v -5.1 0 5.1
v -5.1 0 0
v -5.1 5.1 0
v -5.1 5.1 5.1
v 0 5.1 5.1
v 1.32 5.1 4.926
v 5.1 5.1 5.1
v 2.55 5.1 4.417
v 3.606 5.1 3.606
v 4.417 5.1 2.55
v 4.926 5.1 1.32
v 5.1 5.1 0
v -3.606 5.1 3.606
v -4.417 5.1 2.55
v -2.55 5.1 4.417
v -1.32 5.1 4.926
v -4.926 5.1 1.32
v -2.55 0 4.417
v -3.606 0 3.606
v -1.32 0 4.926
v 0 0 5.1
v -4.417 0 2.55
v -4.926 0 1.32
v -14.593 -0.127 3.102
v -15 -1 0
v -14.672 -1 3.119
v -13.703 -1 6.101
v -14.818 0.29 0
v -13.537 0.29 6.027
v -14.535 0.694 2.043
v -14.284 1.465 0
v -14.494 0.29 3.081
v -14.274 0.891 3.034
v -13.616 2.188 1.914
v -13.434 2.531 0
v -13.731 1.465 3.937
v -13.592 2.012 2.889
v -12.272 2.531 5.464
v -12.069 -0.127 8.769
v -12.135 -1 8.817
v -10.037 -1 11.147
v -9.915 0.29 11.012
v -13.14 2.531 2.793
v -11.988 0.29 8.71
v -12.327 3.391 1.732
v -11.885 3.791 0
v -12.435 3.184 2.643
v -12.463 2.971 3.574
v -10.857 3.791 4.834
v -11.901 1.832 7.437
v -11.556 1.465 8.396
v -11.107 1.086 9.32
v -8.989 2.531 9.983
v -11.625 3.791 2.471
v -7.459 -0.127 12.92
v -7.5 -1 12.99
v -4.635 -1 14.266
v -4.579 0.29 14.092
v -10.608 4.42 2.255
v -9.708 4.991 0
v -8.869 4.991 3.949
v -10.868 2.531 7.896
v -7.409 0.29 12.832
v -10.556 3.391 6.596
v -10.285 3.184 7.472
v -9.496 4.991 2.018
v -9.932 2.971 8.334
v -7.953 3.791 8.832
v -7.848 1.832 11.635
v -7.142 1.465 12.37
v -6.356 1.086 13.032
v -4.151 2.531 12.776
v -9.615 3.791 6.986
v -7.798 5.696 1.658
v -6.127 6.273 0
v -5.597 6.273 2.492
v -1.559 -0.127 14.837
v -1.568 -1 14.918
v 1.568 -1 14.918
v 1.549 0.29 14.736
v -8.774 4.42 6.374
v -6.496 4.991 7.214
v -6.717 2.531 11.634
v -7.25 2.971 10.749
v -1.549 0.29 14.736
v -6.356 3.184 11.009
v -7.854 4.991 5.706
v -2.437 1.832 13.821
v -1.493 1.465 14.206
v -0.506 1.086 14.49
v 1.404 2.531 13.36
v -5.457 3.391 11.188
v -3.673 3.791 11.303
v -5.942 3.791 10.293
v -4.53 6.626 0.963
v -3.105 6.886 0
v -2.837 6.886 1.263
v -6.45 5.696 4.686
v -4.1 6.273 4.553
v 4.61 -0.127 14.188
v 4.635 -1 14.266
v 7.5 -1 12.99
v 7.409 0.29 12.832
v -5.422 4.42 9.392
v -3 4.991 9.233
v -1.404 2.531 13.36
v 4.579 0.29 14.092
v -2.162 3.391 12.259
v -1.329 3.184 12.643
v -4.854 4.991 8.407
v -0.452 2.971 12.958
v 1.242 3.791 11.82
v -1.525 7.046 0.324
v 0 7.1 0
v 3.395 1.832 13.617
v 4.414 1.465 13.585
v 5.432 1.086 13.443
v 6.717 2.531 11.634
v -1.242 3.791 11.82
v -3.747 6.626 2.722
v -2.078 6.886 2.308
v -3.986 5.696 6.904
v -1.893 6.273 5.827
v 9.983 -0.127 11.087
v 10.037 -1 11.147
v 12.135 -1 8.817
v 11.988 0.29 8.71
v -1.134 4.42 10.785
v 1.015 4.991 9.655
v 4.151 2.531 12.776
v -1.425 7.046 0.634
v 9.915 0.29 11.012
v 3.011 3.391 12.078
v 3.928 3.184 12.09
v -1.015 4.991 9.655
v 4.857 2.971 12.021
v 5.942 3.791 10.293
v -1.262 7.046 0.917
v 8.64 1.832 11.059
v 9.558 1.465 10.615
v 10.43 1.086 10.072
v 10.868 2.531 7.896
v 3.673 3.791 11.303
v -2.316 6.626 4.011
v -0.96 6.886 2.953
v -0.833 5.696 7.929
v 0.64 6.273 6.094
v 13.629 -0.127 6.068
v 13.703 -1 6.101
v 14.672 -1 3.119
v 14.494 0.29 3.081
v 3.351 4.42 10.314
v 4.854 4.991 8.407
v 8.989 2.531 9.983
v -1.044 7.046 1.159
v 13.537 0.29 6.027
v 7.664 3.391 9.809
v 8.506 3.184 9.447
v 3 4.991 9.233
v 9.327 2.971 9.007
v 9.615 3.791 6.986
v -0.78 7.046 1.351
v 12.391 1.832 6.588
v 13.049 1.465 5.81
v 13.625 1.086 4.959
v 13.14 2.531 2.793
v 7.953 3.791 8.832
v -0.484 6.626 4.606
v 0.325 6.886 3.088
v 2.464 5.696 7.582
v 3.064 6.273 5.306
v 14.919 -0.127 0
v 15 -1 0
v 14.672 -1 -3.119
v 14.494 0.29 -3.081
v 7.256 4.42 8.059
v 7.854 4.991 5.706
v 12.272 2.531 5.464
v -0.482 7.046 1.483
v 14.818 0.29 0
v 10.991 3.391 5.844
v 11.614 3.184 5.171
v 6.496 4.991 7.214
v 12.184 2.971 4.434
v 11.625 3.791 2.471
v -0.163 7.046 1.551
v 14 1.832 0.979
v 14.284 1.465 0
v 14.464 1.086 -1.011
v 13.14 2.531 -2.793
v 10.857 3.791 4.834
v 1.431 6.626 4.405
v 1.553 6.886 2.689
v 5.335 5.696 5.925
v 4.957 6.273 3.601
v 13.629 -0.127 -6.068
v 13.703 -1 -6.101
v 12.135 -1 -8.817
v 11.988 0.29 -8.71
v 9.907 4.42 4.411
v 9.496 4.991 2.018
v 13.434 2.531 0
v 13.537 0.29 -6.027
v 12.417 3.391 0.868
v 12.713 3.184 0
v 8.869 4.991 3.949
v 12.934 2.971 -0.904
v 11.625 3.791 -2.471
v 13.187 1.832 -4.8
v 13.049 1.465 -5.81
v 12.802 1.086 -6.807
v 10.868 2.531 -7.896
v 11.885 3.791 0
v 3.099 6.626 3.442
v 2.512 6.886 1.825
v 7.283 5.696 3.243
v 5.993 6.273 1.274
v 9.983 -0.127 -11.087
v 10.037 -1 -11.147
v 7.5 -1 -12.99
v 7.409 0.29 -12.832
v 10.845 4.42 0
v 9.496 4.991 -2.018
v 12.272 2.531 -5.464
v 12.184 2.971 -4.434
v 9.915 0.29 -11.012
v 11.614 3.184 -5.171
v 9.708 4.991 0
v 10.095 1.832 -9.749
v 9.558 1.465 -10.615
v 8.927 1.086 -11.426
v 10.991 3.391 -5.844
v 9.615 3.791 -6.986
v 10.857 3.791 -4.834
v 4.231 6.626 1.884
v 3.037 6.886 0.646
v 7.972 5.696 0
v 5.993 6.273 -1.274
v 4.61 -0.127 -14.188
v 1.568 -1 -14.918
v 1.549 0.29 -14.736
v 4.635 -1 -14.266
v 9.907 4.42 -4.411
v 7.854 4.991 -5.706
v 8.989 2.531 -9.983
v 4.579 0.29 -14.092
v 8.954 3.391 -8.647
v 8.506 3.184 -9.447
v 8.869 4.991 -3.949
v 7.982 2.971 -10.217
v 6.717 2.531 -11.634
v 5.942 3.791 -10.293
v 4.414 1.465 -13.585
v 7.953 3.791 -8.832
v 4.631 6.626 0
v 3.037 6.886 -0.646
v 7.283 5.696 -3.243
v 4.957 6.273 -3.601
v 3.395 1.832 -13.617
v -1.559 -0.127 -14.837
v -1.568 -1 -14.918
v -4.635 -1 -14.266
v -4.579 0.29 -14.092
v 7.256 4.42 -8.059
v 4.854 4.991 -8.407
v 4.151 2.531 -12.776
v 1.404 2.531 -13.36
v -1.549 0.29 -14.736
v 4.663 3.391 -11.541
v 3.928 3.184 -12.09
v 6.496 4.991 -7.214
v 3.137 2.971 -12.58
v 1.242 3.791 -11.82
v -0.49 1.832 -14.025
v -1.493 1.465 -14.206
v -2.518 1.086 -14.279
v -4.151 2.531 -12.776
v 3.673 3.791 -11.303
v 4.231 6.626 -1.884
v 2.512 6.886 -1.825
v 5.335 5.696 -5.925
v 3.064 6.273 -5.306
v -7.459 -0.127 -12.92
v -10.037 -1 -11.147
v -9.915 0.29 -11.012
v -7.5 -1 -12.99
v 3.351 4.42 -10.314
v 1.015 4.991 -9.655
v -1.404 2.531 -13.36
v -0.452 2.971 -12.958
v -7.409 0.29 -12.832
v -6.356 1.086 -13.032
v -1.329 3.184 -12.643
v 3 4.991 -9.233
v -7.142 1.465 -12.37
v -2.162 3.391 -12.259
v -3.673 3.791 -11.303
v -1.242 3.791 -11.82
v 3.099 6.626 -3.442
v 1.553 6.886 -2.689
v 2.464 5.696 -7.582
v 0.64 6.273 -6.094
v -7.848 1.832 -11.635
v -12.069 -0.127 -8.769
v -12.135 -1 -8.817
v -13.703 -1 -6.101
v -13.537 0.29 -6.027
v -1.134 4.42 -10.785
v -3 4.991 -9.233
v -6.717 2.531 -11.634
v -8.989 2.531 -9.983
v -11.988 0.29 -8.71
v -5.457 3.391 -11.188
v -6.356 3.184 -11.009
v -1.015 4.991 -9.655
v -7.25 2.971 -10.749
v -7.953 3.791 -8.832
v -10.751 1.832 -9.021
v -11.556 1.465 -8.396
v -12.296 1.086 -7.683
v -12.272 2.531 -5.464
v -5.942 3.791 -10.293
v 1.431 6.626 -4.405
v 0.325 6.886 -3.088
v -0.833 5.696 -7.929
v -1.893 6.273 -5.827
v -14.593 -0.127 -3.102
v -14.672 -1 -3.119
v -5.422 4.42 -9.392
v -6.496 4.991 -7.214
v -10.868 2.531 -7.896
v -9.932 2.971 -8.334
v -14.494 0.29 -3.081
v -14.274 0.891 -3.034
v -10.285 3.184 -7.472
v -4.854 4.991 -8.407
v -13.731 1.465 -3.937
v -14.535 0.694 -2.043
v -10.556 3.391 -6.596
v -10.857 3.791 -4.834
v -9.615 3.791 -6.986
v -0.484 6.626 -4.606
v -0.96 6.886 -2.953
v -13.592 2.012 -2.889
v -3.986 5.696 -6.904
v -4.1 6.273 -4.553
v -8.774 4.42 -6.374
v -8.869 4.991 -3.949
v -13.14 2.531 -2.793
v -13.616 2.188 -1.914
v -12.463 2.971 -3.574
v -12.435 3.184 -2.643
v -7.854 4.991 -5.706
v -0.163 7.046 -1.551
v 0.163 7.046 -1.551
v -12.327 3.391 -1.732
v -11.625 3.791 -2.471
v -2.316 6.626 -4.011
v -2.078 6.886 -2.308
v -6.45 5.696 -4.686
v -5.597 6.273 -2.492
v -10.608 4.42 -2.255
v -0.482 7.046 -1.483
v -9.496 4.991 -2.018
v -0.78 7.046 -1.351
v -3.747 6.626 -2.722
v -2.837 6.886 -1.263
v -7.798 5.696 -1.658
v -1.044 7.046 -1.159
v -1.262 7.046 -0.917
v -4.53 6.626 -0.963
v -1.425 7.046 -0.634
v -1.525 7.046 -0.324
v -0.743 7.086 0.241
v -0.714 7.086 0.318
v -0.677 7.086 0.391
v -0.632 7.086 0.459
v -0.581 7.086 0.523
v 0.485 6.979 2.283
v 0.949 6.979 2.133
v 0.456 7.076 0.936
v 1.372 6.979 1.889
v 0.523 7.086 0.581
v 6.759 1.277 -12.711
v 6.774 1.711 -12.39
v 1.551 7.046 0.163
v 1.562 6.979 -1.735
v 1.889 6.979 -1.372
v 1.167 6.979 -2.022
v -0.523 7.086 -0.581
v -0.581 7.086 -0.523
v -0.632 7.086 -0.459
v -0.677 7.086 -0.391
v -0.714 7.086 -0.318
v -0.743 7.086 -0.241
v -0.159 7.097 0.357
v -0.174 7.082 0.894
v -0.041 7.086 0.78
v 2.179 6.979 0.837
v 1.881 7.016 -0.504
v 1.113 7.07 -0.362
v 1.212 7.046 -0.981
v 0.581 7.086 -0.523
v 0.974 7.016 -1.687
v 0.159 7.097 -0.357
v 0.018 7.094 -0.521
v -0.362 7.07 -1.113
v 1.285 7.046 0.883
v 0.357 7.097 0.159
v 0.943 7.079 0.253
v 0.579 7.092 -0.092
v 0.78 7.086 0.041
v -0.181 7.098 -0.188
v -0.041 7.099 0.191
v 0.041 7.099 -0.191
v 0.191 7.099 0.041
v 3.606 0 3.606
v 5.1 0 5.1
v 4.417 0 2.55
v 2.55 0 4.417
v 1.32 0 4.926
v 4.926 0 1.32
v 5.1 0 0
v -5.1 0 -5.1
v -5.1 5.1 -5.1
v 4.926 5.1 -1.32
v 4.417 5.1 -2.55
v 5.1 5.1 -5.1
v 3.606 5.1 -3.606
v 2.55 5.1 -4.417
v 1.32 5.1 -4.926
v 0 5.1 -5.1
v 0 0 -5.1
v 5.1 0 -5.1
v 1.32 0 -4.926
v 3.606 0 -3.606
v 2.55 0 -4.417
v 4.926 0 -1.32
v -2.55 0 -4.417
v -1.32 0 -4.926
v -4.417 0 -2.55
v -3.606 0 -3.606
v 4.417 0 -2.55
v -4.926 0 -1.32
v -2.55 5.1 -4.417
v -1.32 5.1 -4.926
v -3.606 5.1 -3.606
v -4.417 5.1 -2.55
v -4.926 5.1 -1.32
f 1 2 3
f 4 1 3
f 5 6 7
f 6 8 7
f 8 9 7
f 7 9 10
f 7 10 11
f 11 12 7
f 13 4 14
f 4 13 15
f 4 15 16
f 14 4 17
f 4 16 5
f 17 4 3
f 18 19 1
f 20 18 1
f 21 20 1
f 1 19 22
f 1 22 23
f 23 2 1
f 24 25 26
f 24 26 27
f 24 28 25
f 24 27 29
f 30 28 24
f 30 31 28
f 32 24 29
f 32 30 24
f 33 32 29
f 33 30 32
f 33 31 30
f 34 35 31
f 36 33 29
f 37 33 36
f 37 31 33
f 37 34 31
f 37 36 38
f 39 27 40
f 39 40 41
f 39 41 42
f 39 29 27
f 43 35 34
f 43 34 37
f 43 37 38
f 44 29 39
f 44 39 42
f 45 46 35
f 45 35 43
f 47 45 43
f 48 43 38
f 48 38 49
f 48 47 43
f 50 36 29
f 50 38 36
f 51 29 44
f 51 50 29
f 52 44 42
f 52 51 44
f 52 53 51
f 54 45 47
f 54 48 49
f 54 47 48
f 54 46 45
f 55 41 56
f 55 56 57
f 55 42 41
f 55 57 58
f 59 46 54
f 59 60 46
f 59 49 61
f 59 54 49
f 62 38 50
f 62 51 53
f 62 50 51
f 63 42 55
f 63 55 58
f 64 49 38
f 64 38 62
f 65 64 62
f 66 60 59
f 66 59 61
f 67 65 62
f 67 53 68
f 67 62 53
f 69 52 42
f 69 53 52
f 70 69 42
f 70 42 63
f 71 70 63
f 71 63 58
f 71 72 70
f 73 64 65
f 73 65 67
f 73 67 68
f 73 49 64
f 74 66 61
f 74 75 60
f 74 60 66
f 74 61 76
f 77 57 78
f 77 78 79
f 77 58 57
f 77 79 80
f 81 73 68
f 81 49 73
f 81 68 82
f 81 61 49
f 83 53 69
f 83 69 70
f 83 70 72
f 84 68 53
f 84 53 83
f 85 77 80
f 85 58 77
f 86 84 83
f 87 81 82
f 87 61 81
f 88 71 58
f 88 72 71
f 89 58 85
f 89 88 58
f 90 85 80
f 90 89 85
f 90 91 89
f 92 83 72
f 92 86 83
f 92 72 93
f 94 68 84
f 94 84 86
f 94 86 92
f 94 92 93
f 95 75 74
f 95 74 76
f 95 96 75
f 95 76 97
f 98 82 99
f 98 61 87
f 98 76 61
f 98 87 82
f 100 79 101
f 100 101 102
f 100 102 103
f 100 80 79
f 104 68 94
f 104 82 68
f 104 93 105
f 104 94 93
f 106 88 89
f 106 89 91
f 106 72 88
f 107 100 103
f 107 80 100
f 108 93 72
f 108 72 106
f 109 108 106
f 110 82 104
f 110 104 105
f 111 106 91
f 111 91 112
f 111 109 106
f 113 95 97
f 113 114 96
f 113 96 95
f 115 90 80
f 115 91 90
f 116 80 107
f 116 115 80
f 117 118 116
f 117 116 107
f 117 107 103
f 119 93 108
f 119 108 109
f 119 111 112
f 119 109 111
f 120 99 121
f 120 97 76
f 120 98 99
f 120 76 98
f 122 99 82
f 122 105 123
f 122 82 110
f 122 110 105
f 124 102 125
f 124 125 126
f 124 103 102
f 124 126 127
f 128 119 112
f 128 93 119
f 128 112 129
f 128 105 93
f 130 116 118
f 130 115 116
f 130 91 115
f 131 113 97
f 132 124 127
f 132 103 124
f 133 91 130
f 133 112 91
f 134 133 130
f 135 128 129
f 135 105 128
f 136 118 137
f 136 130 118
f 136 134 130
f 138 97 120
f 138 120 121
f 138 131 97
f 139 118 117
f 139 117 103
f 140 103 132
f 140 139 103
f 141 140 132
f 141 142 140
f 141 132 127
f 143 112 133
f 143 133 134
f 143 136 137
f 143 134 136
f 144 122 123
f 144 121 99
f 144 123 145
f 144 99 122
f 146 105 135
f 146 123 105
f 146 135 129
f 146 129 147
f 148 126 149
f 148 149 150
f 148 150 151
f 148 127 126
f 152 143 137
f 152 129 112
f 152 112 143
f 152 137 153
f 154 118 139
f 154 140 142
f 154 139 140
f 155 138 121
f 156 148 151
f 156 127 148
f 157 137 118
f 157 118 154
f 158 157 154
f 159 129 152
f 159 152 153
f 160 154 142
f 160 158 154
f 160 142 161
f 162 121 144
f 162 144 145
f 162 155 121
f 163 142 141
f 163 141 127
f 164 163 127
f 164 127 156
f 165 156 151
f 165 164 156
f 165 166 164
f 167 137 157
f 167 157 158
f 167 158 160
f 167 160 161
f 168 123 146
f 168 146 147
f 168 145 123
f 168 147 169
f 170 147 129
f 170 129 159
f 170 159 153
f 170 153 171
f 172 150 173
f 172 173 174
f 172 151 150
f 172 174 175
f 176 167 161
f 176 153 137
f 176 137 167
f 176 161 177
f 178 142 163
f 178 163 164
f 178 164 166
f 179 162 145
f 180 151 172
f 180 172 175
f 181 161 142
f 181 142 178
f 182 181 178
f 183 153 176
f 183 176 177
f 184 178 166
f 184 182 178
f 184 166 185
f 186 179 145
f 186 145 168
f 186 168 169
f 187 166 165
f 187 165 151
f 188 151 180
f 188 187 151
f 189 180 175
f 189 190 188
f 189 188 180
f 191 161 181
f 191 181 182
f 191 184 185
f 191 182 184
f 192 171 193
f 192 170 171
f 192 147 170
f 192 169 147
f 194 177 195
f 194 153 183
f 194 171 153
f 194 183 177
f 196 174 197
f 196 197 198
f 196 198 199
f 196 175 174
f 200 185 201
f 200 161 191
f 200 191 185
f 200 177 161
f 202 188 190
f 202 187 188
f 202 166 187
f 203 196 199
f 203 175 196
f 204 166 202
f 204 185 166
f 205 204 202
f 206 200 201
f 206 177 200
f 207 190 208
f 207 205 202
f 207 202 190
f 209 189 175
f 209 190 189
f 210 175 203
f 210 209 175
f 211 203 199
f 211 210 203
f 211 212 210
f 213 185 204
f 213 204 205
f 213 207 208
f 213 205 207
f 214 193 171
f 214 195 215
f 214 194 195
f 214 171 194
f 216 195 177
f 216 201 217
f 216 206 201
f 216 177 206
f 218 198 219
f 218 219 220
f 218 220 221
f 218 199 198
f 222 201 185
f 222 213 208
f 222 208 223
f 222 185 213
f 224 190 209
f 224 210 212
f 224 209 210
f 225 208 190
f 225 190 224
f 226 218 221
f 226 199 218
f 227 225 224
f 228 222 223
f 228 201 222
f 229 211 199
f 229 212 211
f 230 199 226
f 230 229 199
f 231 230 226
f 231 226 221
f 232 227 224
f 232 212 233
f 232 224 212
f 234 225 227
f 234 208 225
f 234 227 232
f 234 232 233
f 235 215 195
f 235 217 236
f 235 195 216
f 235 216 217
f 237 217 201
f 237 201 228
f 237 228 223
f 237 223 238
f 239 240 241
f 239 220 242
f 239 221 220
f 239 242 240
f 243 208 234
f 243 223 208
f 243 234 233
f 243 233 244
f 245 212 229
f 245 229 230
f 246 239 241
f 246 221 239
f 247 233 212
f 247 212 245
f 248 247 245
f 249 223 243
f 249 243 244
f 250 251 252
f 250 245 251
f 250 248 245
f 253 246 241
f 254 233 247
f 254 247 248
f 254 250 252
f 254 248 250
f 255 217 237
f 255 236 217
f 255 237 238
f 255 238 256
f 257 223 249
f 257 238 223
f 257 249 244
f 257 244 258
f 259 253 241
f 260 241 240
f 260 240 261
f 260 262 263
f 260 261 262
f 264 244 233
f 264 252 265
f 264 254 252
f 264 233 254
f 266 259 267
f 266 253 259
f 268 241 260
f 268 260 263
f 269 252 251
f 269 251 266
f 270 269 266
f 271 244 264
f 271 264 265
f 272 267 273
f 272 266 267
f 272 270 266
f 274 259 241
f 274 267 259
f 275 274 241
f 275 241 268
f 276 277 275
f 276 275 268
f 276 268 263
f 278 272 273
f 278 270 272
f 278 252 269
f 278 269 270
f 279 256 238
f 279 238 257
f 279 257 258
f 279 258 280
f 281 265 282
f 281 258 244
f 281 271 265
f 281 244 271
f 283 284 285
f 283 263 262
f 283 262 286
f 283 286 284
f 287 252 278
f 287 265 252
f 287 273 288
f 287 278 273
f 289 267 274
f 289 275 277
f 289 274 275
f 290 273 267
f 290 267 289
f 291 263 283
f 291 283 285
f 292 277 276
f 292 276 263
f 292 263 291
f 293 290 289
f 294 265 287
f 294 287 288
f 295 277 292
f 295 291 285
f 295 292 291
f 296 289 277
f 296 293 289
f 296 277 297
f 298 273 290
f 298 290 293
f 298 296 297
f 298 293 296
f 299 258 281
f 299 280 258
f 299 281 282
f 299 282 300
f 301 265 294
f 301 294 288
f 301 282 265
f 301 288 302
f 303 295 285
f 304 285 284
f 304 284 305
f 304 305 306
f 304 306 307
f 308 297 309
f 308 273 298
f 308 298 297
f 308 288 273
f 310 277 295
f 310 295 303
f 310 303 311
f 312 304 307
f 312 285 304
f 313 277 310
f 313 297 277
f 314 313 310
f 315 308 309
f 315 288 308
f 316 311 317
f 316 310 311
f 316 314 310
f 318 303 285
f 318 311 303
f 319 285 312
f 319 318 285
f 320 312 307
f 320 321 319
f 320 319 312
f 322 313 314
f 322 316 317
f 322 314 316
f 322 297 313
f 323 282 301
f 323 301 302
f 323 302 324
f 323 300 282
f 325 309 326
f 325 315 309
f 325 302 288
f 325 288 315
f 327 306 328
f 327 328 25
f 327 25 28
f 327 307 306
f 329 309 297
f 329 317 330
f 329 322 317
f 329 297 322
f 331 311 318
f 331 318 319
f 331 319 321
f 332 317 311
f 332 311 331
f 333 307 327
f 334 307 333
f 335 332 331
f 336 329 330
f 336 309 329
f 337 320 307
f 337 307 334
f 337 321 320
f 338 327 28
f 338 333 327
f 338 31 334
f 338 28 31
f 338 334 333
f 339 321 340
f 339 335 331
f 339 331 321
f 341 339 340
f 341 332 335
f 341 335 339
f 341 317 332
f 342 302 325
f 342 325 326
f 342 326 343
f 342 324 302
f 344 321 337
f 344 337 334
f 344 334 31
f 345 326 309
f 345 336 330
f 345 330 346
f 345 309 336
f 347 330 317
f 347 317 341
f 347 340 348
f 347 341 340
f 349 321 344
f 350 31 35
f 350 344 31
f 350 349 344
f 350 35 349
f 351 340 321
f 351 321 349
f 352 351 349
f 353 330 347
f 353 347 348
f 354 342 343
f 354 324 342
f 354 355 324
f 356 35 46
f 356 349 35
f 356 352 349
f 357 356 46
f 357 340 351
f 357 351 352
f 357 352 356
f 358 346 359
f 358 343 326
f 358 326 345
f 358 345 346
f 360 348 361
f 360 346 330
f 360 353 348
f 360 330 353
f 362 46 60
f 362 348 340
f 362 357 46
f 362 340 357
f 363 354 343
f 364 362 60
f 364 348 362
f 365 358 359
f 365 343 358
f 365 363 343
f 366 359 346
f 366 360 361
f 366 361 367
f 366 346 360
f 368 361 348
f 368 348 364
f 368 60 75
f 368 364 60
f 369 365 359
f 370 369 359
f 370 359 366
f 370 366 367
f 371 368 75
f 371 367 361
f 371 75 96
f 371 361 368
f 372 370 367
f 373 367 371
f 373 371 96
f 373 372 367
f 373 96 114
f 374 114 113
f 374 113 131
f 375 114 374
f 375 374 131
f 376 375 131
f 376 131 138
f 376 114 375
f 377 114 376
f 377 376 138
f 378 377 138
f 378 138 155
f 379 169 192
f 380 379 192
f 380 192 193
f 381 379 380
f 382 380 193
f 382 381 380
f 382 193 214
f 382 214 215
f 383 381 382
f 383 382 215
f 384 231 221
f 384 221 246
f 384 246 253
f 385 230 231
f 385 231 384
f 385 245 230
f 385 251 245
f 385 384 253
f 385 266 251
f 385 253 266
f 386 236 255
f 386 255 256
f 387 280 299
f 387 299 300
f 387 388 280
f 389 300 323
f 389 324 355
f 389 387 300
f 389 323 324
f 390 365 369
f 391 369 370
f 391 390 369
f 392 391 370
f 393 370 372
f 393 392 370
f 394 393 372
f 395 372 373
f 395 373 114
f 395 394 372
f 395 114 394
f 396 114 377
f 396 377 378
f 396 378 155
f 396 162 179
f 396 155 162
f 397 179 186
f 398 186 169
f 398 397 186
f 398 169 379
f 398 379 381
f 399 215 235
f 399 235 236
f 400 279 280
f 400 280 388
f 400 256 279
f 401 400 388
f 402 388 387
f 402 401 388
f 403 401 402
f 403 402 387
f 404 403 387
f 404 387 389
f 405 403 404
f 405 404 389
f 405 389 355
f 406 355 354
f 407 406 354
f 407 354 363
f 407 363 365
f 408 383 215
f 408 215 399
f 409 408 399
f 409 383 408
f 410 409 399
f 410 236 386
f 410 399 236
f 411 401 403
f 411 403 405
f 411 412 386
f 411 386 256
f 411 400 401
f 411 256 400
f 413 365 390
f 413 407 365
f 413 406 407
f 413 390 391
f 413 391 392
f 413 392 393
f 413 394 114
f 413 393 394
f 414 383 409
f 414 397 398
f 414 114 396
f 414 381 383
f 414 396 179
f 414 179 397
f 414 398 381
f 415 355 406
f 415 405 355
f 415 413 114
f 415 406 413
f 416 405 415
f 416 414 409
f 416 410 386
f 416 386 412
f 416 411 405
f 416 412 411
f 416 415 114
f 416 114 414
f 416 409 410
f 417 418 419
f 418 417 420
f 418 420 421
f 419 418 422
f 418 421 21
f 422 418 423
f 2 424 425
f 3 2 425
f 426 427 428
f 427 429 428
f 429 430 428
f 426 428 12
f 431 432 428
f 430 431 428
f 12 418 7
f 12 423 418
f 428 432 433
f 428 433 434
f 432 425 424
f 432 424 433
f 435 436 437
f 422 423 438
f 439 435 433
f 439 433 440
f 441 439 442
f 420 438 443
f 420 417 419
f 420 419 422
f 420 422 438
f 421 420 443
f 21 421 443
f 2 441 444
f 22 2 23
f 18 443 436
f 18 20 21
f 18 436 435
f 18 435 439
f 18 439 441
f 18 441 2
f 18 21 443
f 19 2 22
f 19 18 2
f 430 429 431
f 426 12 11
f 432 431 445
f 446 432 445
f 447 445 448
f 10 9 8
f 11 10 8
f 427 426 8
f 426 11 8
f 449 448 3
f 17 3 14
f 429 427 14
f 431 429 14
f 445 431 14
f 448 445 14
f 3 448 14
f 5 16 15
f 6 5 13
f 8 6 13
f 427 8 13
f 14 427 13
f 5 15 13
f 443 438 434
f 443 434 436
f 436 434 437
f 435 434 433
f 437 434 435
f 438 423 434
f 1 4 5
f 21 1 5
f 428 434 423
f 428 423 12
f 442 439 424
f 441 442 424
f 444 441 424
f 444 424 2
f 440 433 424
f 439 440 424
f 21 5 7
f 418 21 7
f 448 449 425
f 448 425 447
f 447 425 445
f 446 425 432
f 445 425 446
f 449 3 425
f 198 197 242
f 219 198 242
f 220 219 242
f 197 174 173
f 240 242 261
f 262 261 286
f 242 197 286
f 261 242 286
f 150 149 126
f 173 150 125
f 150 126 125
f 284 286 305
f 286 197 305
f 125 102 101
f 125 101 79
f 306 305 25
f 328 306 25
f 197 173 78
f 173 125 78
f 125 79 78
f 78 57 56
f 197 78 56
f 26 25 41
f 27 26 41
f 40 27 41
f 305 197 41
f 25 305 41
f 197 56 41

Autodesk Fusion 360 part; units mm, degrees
sketch "Sketch1" plane through (0, 0, 0) normal (0, 0, 1) x (1, 0, 0)
  line L0 (0, 0) -> (-5.1, 0)
  line L1 (-5.1, 0) -> (-5.1, 5.1)
  line L2 (-5.1, 5.1) -> (0, 5.1)
  line L3 (0, 5.1) -> (0, 7.1)
  line L4 (0, 0) -> (0, -1)
  line L5 (0, -1) -> (-15, -1)
  spline S0 degree 5 poles (-15, -1) (-15, -0.3922) (-14.8133, 0.764) (-13.9738, 2.3202) (-11.8994, 4.069) (-8.3141, 5.7563) (-5.0579, 6.6606) (-2.5435, 7.0201) (-0.8506, 7.1) (0, 7.1) knots 0 0 0 0 0 0 0.2 0.4 0.6 0.8 1 1 1 1 1 1
  line L6 (-2.5, 7.1) -> (2.5, 7.1)
  line L7 (-15, -2.5) -> (-15, 0.5)
  line L8 (0, 2.5) -> (0, 20)
  line L9 (0, 0) -> (5.1, 0)
  spline S1 degree 5 poles (15, -1) (15, -0.3922) (14.8133, 0.764) (13.9738, 2.3202) (11.8994, 4.069) (8.3141, 5.7563) (5.0579, 6.6606) (2.5435, 7.0201) (0.8506, 7.1) (0, 7.1) knots 0 0 0 0 0 0 0.2 0.4 0.6 0.8 1 1 1 1 1 1
  line L10 (15, -2.5) -> (15, 0.5)
  line L11 (2.5, 7.1) -> (-2.5, 7.1)
  line L12 (0, -1) -> (15, -1)
  line L13 (0, 0) -> (0, -1)
  line L14 (5.1, 5.1) -> (0, 5.1)
  line L15 (0, 5.1) -> (0, 7.1)
  line L16 (5.1, 0) -> (5.1, 5.1)
  dimension "d1" = 5.1
  dimension "d2" = 5.1
  dimension "d3" = 2
  dimension "d4" = 1
  dimension "d5" = 15
revolve "Revolve1" add sketch "Sketch1" angle 360 about axis through (0, 1.75, 0) along (0, 1, 0) contours L0 L1 L2 L3 L4 L5 S0 L8 L13 L15
extrude "Extrude1" cut sketch "Sketch1" along normal mid plane 10.2 contours L0 L1 L2 L9 L14 L16
